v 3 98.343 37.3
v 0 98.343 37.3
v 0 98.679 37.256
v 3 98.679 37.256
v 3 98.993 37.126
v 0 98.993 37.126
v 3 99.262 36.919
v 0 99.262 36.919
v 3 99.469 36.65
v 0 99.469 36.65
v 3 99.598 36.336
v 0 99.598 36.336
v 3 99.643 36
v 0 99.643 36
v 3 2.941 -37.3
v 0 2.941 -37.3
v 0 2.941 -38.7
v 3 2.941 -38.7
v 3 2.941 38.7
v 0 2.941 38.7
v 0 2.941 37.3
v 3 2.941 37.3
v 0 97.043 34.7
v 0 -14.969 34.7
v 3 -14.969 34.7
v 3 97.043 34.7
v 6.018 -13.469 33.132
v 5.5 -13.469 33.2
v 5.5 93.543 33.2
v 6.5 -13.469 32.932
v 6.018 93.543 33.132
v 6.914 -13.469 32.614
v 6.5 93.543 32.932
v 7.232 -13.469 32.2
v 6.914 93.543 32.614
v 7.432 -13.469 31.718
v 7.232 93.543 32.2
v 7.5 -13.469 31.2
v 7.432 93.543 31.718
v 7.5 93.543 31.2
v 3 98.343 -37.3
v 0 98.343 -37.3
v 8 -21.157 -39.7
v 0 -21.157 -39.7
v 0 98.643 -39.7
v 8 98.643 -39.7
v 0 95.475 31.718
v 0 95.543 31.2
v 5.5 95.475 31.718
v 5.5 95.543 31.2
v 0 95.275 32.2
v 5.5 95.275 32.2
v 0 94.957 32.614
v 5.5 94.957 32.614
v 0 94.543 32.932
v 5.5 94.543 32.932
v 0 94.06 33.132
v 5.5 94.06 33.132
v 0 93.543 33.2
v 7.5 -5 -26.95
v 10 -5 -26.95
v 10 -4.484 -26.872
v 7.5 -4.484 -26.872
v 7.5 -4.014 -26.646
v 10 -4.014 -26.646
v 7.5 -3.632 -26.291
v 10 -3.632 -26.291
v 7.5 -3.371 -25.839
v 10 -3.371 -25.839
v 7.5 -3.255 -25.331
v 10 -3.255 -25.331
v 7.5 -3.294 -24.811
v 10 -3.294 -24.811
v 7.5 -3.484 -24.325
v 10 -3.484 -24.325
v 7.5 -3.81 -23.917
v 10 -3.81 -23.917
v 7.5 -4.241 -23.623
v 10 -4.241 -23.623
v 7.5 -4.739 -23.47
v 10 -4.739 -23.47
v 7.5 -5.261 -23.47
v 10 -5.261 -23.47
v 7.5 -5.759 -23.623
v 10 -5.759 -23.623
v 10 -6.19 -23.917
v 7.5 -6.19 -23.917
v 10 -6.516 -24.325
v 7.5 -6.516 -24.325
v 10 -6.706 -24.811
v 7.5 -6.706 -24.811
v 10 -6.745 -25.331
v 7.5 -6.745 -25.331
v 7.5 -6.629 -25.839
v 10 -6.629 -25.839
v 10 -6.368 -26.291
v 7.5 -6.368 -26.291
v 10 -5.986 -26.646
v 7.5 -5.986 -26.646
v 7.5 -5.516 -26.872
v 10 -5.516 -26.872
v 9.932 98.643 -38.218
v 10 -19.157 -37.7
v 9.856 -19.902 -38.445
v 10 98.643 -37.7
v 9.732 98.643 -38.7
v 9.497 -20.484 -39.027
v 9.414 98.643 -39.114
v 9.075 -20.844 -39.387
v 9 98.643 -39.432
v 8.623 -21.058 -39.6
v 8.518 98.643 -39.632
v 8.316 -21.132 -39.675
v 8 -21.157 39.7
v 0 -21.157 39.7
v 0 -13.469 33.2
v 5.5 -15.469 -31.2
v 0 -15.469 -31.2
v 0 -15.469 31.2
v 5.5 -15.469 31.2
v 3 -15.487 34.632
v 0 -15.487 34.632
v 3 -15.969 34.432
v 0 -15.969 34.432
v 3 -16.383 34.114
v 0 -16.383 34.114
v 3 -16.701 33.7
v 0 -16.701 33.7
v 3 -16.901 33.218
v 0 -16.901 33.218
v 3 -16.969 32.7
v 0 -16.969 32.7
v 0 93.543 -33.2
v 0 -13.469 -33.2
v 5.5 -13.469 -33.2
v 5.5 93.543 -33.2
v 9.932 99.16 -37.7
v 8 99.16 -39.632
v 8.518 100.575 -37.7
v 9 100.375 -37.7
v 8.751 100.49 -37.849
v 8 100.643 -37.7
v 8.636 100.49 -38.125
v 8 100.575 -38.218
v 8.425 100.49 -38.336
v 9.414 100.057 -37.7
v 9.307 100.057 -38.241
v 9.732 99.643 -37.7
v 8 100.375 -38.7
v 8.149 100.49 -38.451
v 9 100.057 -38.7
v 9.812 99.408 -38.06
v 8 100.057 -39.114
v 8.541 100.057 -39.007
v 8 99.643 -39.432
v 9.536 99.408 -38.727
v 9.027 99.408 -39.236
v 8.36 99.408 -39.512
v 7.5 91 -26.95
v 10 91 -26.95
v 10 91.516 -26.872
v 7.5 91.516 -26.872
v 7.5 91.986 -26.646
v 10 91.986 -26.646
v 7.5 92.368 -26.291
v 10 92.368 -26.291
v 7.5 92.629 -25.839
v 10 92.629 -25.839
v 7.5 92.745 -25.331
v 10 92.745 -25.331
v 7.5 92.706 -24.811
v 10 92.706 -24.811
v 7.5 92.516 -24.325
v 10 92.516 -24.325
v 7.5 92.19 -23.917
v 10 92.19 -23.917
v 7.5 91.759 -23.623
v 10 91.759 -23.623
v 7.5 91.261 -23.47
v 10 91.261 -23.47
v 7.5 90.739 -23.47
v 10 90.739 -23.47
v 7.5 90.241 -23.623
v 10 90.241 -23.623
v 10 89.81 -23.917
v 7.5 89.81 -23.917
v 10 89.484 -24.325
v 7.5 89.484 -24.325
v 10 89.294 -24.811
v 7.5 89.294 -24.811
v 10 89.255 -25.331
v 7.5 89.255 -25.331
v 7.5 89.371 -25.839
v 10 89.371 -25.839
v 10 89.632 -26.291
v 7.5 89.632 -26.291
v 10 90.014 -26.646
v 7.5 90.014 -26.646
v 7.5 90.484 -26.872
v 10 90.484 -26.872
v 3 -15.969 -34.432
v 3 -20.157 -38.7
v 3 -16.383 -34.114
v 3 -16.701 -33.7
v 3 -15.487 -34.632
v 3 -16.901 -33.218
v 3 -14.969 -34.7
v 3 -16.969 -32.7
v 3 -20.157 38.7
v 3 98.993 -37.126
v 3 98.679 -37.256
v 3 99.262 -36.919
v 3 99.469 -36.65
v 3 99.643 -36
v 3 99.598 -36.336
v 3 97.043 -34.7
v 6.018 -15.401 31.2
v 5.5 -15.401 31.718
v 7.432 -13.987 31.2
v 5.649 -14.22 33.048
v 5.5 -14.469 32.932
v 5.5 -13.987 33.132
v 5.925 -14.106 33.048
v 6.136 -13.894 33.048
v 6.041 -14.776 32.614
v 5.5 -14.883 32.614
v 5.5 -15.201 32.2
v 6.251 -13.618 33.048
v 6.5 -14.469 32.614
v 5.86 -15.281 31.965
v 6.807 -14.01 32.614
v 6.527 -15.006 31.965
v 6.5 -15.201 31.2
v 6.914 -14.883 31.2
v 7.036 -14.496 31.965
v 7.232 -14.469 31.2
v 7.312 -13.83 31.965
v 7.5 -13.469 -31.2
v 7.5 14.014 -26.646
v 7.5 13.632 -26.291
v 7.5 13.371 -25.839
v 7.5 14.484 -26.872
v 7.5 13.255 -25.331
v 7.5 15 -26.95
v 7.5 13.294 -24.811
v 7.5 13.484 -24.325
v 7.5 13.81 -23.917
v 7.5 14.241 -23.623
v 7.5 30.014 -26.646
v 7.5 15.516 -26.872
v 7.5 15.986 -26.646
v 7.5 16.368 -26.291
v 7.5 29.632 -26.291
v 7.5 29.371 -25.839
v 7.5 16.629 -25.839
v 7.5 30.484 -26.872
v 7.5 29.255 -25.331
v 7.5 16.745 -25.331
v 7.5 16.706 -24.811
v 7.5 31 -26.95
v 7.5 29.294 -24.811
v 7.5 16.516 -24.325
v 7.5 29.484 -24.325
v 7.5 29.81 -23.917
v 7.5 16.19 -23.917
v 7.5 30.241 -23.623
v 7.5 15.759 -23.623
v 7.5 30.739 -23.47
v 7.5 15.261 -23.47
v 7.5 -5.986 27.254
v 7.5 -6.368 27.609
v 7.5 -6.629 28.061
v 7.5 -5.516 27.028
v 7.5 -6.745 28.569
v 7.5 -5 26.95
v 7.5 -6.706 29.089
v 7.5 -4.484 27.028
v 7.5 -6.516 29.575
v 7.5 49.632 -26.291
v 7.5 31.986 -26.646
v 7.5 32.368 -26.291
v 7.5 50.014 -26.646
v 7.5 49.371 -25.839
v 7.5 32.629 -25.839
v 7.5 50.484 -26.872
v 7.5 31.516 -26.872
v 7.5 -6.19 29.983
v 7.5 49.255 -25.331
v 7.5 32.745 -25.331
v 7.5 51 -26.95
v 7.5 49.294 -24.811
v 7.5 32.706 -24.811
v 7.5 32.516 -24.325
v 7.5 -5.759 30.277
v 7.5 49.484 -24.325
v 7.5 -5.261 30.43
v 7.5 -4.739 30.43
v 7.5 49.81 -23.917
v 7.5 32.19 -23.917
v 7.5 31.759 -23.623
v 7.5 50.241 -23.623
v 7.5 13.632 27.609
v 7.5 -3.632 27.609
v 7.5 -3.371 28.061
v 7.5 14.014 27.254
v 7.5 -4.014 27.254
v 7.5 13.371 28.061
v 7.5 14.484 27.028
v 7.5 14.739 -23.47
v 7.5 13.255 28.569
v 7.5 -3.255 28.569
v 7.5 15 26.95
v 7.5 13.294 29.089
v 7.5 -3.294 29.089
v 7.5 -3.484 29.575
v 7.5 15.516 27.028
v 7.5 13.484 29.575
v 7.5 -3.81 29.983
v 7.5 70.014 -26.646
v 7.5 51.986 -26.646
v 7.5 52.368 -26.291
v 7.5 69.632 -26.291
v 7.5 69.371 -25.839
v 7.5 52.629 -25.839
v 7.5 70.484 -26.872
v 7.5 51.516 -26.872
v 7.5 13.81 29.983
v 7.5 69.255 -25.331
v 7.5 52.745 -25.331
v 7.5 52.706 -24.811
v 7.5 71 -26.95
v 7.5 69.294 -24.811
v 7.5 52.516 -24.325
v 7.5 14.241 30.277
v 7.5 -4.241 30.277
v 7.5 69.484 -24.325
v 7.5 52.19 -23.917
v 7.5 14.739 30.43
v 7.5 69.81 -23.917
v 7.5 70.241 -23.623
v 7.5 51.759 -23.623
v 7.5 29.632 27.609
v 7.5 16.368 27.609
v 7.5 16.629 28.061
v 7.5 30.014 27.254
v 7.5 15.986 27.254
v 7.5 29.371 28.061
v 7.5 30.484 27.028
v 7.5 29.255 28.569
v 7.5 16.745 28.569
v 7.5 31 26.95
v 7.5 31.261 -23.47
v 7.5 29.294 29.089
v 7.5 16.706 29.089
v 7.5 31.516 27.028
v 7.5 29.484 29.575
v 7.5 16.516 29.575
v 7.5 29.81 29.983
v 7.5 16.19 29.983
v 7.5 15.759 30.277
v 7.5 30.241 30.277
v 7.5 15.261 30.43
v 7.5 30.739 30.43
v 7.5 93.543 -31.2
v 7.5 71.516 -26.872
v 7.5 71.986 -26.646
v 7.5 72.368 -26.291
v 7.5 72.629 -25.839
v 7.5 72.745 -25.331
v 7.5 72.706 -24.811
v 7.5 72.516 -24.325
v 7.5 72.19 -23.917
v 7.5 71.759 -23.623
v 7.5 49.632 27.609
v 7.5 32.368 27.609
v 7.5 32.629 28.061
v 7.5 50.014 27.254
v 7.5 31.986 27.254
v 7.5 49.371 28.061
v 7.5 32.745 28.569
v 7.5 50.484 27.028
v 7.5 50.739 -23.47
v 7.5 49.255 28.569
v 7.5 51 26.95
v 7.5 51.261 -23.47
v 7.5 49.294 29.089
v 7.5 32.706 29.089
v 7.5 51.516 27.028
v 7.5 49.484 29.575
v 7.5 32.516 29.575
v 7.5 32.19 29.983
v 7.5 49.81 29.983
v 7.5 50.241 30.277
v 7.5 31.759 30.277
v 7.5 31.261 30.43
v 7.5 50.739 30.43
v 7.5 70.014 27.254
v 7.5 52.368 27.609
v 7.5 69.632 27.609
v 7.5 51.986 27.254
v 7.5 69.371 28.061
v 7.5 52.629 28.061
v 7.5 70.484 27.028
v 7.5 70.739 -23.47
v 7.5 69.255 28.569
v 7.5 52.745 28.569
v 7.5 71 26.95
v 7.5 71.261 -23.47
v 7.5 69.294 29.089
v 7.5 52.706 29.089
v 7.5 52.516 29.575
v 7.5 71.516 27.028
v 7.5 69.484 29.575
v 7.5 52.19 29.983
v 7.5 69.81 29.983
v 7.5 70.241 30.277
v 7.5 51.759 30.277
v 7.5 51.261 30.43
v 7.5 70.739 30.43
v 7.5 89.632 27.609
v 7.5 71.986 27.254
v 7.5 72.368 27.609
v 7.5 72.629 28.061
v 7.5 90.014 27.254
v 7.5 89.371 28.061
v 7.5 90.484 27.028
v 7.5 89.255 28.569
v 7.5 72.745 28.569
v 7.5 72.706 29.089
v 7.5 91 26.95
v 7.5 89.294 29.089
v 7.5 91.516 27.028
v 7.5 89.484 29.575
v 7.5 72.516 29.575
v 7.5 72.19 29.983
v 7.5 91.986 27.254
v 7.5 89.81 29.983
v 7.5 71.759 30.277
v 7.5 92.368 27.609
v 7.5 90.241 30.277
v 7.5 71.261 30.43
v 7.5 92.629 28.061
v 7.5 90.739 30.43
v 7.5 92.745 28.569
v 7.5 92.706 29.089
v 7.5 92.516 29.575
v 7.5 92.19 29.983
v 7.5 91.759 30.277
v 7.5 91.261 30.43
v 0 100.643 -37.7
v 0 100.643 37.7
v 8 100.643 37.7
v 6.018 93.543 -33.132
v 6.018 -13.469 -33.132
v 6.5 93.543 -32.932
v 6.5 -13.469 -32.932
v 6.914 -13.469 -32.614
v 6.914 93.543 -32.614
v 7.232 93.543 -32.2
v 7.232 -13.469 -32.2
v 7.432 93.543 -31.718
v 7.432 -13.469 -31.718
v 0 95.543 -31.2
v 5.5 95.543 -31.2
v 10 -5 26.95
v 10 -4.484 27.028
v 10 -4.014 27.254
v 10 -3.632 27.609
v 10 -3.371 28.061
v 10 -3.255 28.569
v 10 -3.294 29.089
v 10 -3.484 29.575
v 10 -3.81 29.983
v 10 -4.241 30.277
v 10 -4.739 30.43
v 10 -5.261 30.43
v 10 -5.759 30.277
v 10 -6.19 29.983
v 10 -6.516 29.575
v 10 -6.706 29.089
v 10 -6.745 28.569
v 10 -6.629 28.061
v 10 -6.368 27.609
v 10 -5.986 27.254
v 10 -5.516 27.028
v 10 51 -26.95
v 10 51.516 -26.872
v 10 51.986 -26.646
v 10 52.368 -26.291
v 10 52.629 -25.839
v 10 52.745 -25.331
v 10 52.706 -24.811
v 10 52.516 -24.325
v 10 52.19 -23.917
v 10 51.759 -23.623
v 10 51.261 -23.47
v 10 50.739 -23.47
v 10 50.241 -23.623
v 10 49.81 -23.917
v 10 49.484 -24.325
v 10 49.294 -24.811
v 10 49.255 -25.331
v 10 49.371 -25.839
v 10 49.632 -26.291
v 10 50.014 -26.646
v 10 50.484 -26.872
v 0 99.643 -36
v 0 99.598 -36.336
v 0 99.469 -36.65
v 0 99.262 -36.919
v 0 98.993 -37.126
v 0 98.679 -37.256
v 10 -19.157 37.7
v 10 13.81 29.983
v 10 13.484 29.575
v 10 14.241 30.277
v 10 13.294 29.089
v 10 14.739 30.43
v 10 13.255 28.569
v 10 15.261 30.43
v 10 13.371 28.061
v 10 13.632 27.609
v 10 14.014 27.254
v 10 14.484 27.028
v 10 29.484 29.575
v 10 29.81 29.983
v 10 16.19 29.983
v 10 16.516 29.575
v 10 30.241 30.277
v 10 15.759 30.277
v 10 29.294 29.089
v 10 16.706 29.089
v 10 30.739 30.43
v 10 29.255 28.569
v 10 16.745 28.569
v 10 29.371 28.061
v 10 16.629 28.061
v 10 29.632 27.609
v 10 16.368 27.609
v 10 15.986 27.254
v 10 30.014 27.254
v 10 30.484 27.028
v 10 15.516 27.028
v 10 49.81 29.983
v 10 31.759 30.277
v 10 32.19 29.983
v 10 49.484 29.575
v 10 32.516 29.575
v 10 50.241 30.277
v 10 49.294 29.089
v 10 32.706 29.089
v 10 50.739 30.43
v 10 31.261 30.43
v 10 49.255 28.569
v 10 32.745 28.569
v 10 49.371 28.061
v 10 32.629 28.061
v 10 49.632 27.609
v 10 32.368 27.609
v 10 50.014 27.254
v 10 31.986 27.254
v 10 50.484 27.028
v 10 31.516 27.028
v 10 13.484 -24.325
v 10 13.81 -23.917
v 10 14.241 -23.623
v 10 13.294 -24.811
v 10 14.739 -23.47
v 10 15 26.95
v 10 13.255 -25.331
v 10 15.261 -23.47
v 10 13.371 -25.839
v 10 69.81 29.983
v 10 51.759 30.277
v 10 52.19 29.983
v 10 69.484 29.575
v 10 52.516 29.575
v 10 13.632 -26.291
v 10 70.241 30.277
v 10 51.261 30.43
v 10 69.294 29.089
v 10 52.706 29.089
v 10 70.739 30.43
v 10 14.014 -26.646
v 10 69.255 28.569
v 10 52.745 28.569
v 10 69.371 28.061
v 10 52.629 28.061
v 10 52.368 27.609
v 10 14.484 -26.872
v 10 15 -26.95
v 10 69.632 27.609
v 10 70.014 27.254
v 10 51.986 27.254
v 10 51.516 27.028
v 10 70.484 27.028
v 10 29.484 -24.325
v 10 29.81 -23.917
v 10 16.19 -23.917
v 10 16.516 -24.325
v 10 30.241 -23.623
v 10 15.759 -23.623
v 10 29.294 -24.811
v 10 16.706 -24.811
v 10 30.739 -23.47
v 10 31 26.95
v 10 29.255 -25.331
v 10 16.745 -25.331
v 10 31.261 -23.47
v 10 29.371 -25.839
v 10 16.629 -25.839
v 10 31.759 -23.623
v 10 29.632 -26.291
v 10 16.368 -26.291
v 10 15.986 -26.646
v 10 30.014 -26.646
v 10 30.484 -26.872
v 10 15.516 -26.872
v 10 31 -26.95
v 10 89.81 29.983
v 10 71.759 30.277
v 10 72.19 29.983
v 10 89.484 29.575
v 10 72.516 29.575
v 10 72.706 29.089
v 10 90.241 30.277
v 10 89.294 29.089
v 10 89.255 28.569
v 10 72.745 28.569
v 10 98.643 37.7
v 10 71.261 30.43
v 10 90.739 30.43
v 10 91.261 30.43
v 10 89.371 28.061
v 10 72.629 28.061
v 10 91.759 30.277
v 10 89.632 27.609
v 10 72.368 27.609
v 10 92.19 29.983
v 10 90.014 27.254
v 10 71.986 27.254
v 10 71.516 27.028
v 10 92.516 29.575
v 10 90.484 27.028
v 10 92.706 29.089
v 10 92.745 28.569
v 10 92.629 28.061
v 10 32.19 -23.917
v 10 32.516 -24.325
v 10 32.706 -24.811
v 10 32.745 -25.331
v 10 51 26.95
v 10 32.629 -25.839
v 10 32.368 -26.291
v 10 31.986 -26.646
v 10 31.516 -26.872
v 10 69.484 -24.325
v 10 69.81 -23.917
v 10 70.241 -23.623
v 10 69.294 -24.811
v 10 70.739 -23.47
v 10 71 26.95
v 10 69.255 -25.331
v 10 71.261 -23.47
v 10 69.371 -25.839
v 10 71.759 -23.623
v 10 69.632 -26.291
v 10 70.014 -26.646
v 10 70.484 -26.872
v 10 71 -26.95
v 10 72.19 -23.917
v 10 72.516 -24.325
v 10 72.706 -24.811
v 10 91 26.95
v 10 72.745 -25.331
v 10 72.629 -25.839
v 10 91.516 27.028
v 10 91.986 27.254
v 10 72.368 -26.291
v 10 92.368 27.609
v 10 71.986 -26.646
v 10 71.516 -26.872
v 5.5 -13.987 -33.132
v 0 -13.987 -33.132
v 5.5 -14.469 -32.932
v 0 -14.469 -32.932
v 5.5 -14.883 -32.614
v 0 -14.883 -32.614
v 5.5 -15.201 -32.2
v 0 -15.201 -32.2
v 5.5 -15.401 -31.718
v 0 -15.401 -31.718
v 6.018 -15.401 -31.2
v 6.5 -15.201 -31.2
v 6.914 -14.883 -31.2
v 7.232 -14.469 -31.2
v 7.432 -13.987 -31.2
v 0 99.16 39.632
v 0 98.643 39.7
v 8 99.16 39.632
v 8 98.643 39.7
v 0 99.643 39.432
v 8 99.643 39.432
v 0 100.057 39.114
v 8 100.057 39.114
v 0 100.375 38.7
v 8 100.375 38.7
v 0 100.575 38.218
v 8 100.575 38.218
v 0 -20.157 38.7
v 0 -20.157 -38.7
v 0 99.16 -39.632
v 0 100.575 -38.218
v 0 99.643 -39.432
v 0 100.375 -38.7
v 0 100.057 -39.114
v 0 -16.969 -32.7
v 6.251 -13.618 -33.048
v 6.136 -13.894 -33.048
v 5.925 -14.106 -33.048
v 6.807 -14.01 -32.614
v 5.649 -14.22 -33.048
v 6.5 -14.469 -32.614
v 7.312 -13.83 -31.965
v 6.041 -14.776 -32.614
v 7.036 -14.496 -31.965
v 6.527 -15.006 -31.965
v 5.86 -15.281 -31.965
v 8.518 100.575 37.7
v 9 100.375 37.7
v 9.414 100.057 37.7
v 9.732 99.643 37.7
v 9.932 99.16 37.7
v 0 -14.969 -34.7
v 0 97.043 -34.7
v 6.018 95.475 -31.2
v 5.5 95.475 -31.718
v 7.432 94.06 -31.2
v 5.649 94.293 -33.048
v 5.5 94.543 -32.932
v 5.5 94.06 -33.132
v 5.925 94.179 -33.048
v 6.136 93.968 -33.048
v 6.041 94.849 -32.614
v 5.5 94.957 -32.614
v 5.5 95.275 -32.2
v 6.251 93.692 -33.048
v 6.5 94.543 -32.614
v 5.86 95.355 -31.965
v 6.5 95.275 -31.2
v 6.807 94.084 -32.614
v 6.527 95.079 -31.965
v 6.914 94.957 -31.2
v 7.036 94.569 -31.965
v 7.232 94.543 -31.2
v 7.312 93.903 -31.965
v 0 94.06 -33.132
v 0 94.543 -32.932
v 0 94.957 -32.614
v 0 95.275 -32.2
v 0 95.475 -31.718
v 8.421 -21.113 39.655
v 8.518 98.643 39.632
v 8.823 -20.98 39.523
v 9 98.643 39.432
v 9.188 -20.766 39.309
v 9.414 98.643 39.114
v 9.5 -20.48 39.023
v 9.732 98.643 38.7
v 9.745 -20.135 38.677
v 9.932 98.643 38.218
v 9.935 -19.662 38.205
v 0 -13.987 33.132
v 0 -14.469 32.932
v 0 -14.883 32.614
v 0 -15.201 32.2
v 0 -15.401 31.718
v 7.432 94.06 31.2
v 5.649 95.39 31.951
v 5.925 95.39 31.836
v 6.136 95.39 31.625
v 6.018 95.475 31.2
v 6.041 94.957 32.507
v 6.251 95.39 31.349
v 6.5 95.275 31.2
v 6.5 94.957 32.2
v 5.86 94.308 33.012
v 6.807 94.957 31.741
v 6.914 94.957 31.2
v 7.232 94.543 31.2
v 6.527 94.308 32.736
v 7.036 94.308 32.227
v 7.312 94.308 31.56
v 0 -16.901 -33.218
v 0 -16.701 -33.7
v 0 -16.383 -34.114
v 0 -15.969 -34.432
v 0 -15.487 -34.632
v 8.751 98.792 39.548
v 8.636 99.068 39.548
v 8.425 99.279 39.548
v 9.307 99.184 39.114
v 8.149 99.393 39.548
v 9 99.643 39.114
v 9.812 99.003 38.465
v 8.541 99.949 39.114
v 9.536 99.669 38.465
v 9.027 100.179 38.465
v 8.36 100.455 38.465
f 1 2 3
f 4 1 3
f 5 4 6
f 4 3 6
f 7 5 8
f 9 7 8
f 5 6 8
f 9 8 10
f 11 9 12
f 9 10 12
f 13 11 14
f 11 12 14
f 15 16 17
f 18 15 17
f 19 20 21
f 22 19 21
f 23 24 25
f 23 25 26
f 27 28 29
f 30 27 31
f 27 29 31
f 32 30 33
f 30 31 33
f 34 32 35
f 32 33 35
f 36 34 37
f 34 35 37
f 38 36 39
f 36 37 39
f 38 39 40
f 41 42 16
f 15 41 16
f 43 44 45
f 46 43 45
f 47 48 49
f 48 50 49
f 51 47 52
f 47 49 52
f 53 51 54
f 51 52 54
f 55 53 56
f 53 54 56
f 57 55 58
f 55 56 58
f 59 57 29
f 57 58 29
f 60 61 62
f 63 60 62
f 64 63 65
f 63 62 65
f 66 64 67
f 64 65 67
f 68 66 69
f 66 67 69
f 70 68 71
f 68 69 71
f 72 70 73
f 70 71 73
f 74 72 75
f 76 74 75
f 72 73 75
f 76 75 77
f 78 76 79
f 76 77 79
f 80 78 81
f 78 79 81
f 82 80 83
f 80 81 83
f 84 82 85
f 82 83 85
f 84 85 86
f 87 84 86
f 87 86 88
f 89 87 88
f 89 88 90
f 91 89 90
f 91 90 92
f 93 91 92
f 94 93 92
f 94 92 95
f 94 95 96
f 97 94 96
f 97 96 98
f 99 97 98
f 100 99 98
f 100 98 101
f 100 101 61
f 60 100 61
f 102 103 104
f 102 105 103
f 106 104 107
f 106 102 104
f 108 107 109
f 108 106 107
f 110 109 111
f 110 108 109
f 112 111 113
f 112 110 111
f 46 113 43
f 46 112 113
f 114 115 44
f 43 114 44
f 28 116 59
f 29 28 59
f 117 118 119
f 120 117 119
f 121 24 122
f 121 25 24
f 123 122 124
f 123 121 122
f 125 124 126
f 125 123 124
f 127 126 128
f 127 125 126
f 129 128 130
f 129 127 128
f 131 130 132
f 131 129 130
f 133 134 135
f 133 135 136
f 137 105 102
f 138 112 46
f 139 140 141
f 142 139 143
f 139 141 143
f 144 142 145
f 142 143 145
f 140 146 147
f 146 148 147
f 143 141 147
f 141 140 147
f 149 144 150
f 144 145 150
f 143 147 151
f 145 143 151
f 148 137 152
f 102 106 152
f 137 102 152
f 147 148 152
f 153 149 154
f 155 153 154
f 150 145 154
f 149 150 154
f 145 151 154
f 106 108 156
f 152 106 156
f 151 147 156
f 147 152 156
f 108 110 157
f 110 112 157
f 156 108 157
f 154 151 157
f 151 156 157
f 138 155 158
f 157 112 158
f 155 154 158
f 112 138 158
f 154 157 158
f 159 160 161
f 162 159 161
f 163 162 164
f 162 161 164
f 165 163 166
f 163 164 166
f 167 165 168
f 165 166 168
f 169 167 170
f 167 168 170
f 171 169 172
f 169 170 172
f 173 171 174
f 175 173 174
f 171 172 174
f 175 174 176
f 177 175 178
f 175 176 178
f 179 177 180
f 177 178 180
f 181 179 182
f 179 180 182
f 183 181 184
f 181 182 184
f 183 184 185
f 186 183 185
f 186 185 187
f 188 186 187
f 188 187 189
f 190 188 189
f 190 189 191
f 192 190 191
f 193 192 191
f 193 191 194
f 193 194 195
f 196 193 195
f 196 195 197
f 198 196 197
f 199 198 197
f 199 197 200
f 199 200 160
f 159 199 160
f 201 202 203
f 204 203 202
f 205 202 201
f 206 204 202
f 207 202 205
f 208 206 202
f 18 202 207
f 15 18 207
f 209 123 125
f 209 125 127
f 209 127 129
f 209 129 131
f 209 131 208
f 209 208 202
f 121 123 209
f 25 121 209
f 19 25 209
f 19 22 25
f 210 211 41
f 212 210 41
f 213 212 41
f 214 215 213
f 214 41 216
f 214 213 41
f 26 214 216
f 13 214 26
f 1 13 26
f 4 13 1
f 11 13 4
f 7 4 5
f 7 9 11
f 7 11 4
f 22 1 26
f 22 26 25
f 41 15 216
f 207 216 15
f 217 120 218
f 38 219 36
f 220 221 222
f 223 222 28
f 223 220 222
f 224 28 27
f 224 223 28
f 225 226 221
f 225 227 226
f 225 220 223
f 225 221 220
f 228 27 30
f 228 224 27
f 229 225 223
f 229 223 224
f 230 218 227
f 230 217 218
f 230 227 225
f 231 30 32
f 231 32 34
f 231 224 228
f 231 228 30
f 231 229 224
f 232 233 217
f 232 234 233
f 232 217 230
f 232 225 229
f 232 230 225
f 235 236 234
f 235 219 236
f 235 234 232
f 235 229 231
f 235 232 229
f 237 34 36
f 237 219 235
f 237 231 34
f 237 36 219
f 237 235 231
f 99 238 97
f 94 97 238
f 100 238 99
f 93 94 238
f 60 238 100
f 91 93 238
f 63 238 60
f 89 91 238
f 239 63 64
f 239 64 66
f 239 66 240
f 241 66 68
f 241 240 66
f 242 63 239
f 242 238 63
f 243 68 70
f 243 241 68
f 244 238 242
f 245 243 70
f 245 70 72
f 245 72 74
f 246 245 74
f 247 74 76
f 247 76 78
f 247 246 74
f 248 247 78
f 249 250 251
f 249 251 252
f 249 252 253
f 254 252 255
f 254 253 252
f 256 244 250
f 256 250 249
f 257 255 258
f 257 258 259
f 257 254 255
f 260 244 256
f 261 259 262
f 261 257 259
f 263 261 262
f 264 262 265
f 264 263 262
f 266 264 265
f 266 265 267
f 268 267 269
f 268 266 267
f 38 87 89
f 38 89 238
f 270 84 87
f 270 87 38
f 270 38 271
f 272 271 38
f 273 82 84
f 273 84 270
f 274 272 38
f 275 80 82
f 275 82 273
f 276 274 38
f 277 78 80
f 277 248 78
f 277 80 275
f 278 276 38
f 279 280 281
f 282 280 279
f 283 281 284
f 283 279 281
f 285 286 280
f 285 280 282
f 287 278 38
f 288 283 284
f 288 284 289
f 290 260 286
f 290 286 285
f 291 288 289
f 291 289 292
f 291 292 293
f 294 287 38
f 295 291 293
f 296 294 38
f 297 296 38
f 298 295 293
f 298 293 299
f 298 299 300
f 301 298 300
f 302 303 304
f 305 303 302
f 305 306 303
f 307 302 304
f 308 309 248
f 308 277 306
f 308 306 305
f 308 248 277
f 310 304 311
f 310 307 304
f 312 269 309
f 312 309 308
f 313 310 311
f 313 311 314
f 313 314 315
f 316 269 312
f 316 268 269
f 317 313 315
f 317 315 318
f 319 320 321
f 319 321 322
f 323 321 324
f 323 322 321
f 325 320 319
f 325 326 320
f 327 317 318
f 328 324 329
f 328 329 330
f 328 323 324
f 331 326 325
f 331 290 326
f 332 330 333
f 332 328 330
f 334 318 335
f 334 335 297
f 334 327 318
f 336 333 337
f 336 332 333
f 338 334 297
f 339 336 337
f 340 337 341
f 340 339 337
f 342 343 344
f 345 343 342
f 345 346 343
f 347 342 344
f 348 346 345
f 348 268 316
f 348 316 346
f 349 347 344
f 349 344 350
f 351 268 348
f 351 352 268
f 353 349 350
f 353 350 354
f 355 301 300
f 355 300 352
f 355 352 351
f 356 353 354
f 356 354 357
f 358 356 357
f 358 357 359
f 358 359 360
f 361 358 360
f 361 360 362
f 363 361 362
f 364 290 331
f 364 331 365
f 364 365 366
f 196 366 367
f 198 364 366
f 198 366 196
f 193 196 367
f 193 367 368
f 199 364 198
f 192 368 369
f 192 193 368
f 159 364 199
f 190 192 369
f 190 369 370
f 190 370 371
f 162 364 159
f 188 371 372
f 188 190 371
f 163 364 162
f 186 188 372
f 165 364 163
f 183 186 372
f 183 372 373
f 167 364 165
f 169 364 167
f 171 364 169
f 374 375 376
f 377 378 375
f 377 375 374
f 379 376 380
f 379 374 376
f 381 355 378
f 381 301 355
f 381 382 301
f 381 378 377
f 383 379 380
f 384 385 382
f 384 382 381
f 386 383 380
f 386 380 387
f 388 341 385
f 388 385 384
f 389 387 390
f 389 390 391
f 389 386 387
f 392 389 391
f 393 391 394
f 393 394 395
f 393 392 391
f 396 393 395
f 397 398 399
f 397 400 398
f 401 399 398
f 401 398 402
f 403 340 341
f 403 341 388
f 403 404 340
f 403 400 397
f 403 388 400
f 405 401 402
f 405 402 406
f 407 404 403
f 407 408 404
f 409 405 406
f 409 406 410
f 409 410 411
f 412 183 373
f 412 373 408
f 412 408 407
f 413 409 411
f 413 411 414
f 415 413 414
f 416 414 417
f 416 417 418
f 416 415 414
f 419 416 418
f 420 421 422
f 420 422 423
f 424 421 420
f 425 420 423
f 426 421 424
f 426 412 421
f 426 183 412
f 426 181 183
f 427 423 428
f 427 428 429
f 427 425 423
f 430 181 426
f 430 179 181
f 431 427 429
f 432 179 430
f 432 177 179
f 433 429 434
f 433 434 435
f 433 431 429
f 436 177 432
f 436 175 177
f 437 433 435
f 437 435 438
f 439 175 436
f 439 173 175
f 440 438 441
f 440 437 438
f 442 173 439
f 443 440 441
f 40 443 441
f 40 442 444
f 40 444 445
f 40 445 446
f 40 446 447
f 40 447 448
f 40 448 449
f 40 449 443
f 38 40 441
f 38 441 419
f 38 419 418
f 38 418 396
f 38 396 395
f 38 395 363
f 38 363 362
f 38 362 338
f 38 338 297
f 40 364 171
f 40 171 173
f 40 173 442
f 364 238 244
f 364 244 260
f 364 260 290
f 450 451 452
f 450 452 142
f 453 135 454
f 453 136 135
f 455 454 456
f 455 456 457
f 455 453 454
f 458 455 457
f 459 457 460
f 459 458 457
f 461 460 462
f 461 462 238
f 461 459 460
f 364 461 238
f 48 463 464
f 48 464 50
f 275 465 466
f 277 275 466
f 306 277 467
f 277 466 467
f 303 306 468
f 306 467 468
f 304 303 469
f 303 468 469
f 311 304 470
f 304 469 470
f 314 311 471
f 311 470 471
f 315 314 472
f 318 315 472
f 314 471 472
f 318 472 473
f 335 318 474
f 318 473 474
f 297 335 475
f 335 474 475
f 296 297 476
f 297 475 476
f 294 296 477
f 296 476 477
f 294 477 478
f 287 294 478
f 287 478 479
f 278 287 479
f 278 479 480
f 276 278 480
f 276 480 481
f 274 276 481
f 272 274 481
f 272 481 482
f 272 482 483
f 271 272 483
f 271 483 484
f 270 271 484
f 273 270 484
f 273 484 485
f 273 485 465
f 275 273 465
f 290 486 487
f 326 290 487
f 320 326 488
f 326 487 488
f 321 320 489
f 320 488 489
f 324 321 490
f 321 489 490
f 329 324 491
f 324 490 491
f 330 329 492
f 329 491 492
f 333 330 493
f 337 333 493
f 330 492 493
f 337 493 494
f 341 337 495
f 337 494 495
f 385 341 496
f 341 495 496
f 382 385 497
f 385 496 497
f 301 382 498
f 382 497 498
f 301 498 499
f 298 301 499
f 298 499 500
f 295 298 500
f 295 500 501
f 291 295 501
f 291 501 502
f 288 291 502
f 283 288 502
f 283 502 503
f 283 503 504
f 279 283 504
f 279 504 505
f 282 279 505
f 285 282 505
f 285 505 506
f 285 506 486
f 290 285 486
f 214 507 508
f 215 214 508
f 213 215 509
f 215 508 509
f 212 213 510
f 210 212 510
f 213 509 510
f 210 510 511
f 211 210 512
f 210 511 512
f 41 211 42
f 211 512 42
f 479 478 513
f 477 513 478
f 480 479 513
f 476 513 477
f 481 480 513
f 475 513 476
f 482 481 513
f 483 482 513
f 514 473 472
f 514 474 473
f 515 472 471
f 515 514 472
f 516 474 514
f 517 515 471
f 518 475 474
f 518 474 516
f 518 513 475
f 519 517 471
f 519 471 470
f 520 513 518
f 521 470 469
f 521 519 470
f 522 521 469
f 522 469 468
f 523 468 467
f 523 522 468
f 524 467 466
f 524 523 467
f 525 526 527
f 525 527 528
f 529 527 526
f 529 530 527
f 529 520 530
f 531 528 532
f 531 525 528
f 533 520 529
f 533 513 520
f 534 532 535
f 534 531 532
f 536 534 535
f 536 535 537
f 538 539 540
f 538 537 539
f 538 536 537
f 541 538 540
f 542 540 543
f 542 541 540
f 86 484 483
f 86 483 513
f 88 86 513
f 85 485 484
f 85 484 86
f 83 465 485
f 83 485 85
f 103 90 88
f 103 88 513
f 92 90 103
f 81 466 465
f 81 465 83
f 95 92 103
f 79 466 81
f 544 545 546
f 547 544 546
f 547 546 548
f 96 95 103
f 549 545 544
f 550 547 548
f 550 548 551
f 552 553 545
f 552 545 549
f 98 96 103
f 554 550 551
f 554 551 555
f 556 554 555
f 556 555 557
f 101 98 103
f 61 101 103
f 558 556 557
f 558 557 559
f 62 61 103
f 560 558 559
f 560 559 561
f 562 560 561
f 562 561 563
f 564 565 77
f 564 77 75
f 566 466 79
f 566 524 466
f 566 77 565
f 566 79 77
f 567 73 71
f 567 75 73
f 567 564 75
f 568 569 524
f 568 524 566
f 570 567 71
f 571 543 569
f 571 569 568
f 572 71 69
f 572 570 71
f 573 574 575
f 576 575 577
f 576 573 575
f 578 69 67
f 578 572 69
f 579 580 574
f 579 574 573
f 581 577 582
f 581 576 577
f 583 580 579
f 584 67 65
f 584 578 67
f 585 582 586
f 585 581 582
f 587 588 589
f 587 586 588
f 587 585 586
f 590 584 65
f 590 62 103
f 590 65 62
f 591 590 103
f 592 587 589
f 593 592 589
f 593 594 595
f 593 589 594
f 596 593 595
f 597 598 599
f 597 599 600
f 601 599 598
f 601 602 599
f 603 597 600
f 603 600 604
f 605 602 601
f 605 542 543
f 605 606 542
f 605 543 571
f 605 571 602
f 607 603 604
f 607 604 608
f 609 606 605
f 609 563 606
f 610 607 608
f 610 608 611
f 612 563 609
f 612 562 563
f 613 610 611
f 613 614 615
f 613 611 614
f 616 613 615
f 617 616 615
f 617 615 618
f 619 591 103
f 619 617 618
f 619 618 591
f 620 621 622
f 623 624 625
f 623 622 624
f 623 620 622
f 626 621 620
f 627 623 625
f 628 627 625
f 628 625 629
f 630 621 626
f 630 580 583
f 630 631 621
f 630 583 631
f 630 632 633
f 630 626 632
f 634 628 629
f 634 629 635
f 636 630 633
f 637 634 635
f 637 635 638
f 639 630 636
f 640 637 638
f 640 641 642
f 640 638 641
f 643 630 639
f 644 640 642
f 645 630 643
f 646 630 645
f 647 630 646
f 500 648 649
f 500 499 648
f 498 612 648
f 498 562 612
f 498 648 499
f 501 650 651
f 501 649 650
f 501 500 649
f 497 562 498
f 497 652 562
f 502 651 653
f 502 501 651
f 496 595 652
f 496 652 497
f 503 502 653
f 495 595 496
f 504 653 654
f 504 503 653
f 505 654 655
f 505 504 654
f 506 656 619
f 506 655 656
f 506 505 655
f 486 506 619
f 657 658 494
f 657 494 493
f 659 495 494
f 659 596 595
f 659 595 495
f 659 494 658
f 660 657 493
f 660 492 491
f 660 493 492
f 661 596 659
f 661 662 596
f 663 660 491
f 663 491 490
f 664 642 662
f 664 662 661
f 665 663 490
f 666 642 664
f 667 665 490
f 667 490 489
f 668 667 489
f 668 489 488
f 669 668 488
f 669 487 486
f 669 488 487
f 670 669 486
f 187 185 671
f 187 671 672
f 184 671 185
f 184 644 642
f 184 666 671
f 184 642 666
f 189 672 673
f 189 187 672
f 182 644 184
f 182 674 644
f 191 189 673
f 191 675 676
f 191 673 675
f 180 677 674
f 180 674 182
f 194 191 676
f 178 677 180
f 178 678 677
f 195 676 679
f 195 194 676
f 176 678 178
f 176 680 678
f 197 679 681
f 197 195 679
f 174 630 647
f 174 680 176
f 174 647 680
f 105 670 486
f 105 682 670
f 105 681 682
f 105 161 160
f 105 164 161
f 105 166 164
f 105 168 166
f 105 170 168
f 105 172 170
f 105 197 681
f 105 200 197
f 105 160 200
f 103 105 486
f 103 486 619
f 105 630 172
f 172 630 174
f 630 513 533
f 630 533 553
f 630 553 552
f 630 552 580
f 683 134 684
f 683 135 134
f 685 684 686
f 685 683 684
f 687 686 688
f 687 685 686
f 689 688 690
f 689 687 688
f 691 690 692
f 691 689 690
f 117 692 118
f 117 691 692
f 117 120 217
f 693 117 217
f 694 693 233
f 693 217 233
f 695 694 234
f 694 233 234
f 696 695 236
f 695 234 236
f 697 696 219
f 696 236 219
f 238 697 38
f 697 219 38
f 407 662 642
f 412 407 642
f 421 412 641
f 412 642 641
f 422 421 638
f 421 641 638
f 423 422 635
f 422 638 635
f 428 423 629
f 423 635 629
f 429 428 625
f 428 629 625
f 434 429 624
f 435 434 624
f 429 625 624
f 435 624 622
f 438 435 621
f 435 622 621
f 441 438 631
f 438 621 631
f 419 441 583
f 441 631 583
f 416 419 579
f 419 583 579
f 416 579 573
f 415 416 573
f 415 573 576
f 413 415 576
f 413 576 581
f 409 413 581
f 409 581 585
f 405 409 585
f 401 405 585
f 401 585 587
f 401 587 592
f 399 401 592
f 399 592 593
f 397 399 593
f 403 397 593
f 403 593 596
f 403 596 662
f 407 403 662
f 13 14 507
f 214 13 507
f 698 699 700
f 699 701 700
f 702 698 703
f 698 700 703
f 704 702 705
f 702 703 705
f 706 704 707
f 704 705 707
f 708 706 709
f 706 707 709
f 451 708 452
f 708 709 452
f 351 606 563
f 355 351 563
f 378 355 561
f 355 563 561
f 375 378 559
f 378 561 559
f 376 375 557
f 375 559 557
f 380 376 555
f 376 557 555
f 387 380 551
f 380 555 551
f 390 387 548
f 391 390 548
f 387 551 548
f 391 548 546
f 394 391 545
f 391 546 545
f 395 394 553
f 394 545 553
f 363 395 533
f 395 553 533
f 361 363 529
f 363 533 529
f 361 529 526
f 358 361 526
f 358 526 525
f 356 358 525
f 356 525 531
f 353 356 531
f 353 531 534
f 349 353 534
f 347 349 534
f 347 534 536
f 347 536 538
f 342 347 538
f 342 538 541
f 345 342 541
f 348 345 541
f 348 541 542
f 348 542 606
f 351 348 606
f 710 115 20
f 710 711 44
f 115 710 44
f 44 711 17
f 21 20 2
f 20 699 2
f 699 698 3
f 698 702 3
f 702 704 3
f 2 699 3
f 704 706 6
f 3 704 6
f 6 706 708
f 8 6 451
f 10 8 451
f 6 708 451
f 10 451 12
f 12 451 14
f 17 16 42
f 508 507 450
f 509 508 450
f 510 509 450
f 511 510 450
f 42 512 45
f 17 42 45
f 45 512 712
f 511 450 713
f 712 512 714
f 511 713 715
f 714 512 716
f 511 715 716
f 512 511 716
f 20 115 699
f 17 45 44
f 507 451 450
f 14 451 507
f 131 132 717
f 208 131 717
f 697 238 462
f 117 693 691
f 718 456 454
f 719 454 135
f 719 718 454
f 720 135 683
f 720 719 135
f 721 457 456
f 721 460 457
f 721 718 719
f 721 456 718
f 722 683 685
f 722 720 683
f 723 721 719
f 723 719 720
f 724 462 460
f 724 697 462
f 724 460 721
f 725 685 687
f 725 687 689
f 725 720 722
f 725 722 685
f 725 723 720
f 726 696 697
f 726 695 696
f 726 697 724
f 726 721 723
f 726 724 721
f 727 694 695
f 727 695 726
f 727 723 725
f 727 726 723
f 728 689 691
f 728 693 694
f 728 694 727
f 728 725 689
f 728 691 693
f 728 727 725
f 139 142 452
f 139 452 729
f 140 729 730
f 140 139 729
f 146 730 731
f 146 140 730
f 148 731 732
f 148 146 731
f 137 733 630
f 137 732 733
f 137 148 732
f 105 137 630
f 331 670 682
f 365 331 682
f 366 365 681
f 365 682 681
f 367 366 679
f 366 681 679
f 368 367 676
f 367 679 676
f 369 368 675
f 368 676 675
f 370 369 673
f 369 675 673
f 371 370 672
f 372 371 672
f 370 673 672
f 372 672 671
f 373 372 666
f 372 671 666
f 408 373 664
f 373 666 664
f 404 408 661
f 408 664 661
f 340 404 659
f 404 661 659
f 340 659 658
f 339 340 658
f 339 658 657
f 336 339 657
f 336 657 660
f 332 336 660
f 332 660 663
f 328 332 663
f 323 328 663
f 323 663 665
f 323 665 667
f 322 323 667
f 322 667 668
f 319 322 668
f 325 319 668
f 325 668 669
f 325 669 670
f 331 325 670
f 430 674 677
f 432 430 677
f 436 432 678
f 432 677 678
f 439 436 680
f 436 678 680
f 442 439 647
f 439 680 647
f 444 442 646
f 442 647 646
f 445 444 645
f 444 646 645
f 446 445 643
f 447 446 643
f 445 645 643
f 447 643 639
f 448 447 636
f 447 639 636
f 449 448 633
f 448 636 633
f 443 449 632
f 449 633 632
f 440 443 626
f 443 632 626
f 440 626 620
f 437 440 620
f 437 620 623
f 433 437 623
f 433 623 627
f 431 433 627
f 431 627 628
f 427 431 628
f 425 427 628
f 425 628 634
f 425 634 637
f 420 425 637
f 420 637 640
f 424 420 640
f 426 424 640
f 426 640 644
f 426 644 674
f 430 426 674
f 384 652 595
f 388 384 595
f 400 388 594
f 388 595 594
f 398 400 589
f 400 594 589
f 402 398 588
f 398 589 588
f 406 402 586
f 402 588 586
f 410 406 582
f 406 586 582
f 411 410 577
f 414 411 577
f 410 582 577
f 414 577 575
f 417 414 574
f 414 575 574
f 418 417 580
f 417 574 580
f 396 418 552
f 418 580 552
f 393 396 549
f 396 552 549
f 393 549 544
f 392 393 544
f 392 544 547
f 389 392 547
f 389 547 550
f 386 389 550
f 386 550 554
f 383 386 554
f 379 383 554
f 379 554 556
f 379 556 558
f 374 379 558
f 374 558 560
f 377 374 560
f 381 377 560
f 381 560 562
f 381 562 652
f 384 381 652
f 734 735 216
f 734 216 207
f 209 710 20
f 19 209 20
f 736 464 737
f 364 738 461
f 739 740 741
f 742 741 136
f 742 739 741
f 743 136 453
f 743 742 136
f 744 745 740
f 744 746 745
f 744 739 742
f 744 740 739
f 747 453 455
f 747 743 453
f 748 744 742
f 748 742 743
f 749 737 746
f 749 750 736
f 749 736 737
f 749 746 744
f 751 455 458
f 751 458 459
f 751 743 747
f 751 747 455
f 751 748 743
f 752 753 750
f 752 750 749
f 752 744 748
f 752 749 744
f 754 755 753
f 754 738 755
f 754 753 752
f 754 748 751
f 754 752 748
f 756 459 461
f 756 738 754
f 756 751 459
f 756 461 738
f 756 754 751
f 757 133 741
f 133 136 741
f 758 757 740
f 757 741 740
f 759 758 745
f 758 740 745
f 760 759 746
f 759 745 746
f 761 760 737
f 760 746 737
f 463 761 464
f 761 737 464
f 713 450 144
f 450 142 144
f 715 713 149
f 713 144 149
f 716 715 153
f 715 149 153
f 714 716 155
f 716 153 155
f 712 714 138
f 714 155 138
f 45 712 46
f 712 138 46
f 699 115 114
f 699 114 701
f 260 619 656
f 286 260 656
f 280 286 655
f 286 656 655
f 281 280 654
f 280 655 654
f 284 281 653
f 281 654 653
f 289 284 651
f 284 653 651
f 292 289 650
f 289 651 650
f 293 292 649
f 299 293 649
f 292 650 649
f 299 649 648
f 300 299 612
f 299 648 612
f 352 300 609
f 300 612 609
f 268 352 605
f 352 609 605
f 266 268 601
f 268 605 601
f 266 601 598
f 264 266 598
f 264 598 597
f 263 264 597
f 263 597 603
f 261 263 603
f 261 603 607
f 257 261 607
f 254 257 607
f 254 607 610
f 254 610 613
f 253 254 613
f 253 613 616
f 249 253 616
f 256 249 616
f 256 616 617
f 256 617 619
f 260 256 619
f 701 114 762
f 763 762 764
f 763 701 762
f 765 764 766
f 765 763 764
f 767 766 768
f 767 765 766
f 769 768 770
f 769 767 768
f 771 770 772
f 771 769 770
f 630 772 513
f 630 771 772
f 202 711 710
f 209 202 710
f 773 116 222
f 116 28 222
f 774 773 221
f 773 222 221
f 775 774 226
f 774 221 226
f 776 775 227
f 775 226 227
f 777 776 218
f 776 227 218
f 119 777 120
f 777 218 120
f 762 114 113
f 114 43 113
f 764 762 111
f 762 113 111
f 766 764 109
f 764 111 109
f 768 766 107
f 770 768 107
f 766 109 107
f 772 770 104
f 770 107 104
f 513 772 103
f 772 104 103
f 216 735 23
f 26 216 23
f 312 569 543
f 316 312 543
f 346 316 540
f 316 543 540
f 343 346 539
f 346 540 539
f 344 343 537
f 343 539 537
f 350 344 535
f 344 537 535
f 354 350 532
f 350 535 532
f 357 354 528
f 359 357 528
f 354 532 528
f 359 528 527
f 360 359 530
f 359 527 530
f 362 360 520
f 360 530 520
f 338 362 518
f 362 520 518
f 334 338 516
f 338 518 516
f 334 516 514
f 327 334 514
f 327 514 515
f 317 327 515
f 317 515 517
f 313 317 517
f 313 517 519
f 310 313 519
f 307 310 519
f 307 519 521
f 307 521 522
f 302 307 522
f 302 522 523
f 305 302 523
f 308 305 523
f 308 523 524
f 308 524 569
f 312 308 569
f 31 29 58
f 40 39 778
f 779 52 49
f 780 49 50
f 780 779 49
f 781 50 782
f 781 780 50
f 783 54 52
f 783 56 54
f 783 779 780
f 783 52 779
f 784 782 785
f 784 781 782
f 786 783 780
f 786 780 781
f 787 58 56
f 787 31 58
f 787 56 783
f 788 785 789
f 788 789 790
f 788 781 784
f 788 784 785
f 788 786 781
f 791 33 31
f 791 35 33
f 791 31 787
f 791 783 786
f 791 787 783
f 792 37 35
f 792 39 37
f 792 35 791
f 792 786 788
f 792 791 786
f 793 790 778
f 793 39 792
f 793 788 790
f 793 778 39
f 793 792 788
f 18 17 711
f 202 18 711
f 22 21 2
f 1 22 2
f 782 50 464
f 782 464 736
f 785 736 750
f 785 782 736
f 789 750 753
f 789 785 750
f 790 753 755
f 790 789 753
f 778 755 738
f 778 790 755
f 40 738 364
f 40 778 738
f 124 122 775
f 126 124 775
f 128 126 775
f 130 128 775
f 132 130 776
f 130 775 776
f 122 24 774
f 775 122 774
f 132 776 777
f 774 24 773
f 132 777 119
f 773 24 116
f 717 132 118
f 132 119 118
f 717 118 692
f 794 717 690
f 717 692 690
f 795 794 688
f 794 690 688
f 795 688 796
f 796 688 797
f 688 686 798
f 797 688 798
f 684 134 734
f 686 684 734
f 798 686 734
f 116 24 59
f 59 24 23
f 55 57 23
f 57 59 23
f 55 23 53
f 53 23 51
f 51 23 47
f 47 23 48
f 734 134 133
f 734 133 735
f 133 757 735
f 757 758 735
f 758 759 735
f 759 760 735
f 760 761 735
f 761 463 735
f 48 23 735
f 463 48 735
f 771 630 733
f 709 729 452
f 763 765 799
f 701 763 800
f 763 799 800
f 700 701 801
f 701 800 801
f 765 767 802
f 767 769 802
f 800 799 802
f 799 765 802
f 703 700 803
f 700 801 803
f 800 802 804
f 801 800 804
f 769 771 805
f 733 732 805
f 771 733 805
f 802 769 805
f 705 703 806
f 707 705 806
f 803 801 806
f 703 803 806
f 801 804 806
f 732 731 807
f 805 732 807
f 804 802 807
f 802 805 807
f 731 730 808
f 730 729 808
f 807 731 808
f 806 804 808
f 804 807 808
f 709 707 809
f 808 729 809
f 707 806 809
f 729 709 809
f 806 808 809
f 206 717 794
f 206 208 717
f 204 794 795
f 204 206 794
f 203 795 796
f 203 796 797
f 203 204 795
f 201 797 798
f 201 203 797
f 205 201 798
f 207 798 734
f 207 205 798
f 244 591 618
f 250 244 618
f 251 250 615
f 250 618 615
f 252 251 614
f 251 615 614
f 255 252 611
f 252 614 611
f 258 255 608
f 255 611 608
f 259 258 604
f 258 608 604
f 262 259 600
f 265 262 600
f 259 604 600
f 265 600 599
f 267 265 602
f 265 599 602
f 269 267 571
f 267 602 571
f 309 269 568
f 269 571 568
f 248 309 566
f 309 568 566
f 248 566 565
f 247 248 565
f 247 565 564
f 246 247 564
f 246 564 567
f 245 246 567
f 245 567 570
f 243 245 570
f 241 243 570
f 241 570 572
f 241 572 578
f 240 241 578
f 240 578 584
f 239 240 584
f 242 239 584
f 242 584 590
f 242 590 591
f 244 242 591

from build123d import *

# Parameters (mm, degrees)
SKETCH2_W           = 79.4
SKETCH2_H           = 121.8
BOSS_EXTRUDE1_DEPTH = 10
CUT_EXTRUDE1_DEPTH  = 3
SKETCH7_W           = 66.4
SKETCH7_H           = 111.011877984
CUT_EXTRUDE4_DEPTH  = 7.5
FILLET2_R           = 2
SKETCH6_R           = 1.75
CUT_EXTRUDE5_DEPTH  = 26.5


with BuildPart() as part:
    # Sketch2 → Boss-Extrude1 (new body)
    with BuildSketch(Plane(origin=(0, 0, 0), x_dir=(0, 0, -1), z_dir=(1, 0, 0))):
        with Locations((0, 39.742697631)):
            Rectangle(SKETCH2_W, SKETCH2_H)
    extrude(amount=BOSS_EXTRUDE1_DEPTH)

    # Sketch3 → Cut-Extrude1 (cut)
    with BuildSketch(Plane(origin=(0, 0, 0), x_dir=(0, 0, -1), z_dir=(1, 0, 0))):
        with BuildLine():
            Line((-38.7, 1.942697631), (-38.7, 2.940614447))
            Line((-38.7, 2.940614447), (-37.3, 2.940614447))
            Line((-37.3, 2.940614447), (-37.3, 98.342697631))
            ThreePointArc((-37.3, 98.342697631), (-36.919238816, 99.261936446), (-36, 99.642697631))
            Line((-36, 99.642697631), (36, 99.642697631))
            ThreePointArc((36, 99.642697631), (36.919238816, 99.261936446), (37.3, 98.342697631))
            Line((37.3, 98.342697631), (37.3, 2.940614447))
            Line((37.3, 2.940614447), (38.7, 2.940614447))
            Line((38.7, 2.940614447), (38.7, 1.942697631))
            Line((38.7, 1.942697631), (38.7, -20.157302369))
            Line((38.7, -20.157302369), (-38.7, -20.157302369))
            Line((-38.7, -20.157302369), (-38.7, 1.942697631))
        make_face()
        Polygon((-34.7, -15.857302369), (-34.7, -16.969180353), (34.7, -16.969180353), (34.7, -15.857302369), (34.7, -1.057302369), (34.7, -0.657302369), (34.7, 97.042697631), (-34.7, 97.042697631), (-34.7, -0.657302369), (-34.7, -1.057302369), align=None, mode=Mode.SUBTRACT)
    extrude(amount=CUT_EXTRUDE1_DEPTH, mode=Mode.SUBTRACT)

    # Sketch7 → Cut-Extrude4 (cut)
    with BuildSketch(Plane.ZY):
        with Locations((0, 40.036758639)):
            Rectangle(SKETCH7_W, SKETCH7_H)
    extrude(amount=-CUT_EXTRUDE4_DEPTH, mode=Mode.SUBTRACT)

    # Fillet2
    fillet2_edges = [part.edges().sort_by_distance(p)[0] for p in [
        (10, 39.742697631, -39.7),
        (10, 100.642697631, 0),
        (1.5, -16.969180353, 34.7),
        (1.5, -16.969180353, -34.7),
        (10, 39.742697631, 39.7),
        (7.5, -15.469180353, 0),
        (3.75, -15.469180353, 33.2),
        (7.5, 40.036758639, 33.2),
        (3.75, 95.542697631, 33.2),
        (7.5, 95.542697631, 0),
        (3.75, 95.542697631, -33.2),
        (7.5, 40.036758639, -33.2),
        (3.75, -15.469180353, -33.2),
        (10, -21.157302369, 0),
        (5, 100.642697631, 39.7),
        (5, 100.642697631, -39.7),
    ]]
    fillet(fillet2_edges, radius=FILLET2_R)

    # Sketch6 → Cut-Extrude5 (cut)
    with BuildSketch(Plane(origin=(10, 0, 0), x_dir=(0, 0, -1), z_dir=(1, 0, 0))):
        with Locations((-28.7, 91)):
            Circle(SKETCH6_R)
        with Locations((25.2, 91)):
            Circle(SKETCH6_R)
        with Locations((-28.7, 71)):
            Circle(SKETCH6_R)
        with Locations((-28.7, 51)):
            Circle(SKETCH6_R)
        with Locations((-28.7, 31)):
            Circle(SKETCH6_R)
        with Locations((25.2, 31)):
            Circle(SKETCH6_R)
        with Locations((25.2, 51)):
            Circle(SKETCH6_R)
        with Locations((25.2, 71)):
            Circle(SKETCH6_R)
        with Locations((-28.7, 15)):
            Circle(SKETCH6_R)
        with Locations((25.2, 15)):
            Circle(SKETCH6_R)
        with Locations((-28.7, -5)):
            Circle(SKETCH6_R)
        with Locations((25.2, -5)):
            Circle(SKETCH6_R)
    extrude(amount=-CUT_EXTRUDE5_DEPTH, mode=Mode.SUBTRACT)


solid = part.part
